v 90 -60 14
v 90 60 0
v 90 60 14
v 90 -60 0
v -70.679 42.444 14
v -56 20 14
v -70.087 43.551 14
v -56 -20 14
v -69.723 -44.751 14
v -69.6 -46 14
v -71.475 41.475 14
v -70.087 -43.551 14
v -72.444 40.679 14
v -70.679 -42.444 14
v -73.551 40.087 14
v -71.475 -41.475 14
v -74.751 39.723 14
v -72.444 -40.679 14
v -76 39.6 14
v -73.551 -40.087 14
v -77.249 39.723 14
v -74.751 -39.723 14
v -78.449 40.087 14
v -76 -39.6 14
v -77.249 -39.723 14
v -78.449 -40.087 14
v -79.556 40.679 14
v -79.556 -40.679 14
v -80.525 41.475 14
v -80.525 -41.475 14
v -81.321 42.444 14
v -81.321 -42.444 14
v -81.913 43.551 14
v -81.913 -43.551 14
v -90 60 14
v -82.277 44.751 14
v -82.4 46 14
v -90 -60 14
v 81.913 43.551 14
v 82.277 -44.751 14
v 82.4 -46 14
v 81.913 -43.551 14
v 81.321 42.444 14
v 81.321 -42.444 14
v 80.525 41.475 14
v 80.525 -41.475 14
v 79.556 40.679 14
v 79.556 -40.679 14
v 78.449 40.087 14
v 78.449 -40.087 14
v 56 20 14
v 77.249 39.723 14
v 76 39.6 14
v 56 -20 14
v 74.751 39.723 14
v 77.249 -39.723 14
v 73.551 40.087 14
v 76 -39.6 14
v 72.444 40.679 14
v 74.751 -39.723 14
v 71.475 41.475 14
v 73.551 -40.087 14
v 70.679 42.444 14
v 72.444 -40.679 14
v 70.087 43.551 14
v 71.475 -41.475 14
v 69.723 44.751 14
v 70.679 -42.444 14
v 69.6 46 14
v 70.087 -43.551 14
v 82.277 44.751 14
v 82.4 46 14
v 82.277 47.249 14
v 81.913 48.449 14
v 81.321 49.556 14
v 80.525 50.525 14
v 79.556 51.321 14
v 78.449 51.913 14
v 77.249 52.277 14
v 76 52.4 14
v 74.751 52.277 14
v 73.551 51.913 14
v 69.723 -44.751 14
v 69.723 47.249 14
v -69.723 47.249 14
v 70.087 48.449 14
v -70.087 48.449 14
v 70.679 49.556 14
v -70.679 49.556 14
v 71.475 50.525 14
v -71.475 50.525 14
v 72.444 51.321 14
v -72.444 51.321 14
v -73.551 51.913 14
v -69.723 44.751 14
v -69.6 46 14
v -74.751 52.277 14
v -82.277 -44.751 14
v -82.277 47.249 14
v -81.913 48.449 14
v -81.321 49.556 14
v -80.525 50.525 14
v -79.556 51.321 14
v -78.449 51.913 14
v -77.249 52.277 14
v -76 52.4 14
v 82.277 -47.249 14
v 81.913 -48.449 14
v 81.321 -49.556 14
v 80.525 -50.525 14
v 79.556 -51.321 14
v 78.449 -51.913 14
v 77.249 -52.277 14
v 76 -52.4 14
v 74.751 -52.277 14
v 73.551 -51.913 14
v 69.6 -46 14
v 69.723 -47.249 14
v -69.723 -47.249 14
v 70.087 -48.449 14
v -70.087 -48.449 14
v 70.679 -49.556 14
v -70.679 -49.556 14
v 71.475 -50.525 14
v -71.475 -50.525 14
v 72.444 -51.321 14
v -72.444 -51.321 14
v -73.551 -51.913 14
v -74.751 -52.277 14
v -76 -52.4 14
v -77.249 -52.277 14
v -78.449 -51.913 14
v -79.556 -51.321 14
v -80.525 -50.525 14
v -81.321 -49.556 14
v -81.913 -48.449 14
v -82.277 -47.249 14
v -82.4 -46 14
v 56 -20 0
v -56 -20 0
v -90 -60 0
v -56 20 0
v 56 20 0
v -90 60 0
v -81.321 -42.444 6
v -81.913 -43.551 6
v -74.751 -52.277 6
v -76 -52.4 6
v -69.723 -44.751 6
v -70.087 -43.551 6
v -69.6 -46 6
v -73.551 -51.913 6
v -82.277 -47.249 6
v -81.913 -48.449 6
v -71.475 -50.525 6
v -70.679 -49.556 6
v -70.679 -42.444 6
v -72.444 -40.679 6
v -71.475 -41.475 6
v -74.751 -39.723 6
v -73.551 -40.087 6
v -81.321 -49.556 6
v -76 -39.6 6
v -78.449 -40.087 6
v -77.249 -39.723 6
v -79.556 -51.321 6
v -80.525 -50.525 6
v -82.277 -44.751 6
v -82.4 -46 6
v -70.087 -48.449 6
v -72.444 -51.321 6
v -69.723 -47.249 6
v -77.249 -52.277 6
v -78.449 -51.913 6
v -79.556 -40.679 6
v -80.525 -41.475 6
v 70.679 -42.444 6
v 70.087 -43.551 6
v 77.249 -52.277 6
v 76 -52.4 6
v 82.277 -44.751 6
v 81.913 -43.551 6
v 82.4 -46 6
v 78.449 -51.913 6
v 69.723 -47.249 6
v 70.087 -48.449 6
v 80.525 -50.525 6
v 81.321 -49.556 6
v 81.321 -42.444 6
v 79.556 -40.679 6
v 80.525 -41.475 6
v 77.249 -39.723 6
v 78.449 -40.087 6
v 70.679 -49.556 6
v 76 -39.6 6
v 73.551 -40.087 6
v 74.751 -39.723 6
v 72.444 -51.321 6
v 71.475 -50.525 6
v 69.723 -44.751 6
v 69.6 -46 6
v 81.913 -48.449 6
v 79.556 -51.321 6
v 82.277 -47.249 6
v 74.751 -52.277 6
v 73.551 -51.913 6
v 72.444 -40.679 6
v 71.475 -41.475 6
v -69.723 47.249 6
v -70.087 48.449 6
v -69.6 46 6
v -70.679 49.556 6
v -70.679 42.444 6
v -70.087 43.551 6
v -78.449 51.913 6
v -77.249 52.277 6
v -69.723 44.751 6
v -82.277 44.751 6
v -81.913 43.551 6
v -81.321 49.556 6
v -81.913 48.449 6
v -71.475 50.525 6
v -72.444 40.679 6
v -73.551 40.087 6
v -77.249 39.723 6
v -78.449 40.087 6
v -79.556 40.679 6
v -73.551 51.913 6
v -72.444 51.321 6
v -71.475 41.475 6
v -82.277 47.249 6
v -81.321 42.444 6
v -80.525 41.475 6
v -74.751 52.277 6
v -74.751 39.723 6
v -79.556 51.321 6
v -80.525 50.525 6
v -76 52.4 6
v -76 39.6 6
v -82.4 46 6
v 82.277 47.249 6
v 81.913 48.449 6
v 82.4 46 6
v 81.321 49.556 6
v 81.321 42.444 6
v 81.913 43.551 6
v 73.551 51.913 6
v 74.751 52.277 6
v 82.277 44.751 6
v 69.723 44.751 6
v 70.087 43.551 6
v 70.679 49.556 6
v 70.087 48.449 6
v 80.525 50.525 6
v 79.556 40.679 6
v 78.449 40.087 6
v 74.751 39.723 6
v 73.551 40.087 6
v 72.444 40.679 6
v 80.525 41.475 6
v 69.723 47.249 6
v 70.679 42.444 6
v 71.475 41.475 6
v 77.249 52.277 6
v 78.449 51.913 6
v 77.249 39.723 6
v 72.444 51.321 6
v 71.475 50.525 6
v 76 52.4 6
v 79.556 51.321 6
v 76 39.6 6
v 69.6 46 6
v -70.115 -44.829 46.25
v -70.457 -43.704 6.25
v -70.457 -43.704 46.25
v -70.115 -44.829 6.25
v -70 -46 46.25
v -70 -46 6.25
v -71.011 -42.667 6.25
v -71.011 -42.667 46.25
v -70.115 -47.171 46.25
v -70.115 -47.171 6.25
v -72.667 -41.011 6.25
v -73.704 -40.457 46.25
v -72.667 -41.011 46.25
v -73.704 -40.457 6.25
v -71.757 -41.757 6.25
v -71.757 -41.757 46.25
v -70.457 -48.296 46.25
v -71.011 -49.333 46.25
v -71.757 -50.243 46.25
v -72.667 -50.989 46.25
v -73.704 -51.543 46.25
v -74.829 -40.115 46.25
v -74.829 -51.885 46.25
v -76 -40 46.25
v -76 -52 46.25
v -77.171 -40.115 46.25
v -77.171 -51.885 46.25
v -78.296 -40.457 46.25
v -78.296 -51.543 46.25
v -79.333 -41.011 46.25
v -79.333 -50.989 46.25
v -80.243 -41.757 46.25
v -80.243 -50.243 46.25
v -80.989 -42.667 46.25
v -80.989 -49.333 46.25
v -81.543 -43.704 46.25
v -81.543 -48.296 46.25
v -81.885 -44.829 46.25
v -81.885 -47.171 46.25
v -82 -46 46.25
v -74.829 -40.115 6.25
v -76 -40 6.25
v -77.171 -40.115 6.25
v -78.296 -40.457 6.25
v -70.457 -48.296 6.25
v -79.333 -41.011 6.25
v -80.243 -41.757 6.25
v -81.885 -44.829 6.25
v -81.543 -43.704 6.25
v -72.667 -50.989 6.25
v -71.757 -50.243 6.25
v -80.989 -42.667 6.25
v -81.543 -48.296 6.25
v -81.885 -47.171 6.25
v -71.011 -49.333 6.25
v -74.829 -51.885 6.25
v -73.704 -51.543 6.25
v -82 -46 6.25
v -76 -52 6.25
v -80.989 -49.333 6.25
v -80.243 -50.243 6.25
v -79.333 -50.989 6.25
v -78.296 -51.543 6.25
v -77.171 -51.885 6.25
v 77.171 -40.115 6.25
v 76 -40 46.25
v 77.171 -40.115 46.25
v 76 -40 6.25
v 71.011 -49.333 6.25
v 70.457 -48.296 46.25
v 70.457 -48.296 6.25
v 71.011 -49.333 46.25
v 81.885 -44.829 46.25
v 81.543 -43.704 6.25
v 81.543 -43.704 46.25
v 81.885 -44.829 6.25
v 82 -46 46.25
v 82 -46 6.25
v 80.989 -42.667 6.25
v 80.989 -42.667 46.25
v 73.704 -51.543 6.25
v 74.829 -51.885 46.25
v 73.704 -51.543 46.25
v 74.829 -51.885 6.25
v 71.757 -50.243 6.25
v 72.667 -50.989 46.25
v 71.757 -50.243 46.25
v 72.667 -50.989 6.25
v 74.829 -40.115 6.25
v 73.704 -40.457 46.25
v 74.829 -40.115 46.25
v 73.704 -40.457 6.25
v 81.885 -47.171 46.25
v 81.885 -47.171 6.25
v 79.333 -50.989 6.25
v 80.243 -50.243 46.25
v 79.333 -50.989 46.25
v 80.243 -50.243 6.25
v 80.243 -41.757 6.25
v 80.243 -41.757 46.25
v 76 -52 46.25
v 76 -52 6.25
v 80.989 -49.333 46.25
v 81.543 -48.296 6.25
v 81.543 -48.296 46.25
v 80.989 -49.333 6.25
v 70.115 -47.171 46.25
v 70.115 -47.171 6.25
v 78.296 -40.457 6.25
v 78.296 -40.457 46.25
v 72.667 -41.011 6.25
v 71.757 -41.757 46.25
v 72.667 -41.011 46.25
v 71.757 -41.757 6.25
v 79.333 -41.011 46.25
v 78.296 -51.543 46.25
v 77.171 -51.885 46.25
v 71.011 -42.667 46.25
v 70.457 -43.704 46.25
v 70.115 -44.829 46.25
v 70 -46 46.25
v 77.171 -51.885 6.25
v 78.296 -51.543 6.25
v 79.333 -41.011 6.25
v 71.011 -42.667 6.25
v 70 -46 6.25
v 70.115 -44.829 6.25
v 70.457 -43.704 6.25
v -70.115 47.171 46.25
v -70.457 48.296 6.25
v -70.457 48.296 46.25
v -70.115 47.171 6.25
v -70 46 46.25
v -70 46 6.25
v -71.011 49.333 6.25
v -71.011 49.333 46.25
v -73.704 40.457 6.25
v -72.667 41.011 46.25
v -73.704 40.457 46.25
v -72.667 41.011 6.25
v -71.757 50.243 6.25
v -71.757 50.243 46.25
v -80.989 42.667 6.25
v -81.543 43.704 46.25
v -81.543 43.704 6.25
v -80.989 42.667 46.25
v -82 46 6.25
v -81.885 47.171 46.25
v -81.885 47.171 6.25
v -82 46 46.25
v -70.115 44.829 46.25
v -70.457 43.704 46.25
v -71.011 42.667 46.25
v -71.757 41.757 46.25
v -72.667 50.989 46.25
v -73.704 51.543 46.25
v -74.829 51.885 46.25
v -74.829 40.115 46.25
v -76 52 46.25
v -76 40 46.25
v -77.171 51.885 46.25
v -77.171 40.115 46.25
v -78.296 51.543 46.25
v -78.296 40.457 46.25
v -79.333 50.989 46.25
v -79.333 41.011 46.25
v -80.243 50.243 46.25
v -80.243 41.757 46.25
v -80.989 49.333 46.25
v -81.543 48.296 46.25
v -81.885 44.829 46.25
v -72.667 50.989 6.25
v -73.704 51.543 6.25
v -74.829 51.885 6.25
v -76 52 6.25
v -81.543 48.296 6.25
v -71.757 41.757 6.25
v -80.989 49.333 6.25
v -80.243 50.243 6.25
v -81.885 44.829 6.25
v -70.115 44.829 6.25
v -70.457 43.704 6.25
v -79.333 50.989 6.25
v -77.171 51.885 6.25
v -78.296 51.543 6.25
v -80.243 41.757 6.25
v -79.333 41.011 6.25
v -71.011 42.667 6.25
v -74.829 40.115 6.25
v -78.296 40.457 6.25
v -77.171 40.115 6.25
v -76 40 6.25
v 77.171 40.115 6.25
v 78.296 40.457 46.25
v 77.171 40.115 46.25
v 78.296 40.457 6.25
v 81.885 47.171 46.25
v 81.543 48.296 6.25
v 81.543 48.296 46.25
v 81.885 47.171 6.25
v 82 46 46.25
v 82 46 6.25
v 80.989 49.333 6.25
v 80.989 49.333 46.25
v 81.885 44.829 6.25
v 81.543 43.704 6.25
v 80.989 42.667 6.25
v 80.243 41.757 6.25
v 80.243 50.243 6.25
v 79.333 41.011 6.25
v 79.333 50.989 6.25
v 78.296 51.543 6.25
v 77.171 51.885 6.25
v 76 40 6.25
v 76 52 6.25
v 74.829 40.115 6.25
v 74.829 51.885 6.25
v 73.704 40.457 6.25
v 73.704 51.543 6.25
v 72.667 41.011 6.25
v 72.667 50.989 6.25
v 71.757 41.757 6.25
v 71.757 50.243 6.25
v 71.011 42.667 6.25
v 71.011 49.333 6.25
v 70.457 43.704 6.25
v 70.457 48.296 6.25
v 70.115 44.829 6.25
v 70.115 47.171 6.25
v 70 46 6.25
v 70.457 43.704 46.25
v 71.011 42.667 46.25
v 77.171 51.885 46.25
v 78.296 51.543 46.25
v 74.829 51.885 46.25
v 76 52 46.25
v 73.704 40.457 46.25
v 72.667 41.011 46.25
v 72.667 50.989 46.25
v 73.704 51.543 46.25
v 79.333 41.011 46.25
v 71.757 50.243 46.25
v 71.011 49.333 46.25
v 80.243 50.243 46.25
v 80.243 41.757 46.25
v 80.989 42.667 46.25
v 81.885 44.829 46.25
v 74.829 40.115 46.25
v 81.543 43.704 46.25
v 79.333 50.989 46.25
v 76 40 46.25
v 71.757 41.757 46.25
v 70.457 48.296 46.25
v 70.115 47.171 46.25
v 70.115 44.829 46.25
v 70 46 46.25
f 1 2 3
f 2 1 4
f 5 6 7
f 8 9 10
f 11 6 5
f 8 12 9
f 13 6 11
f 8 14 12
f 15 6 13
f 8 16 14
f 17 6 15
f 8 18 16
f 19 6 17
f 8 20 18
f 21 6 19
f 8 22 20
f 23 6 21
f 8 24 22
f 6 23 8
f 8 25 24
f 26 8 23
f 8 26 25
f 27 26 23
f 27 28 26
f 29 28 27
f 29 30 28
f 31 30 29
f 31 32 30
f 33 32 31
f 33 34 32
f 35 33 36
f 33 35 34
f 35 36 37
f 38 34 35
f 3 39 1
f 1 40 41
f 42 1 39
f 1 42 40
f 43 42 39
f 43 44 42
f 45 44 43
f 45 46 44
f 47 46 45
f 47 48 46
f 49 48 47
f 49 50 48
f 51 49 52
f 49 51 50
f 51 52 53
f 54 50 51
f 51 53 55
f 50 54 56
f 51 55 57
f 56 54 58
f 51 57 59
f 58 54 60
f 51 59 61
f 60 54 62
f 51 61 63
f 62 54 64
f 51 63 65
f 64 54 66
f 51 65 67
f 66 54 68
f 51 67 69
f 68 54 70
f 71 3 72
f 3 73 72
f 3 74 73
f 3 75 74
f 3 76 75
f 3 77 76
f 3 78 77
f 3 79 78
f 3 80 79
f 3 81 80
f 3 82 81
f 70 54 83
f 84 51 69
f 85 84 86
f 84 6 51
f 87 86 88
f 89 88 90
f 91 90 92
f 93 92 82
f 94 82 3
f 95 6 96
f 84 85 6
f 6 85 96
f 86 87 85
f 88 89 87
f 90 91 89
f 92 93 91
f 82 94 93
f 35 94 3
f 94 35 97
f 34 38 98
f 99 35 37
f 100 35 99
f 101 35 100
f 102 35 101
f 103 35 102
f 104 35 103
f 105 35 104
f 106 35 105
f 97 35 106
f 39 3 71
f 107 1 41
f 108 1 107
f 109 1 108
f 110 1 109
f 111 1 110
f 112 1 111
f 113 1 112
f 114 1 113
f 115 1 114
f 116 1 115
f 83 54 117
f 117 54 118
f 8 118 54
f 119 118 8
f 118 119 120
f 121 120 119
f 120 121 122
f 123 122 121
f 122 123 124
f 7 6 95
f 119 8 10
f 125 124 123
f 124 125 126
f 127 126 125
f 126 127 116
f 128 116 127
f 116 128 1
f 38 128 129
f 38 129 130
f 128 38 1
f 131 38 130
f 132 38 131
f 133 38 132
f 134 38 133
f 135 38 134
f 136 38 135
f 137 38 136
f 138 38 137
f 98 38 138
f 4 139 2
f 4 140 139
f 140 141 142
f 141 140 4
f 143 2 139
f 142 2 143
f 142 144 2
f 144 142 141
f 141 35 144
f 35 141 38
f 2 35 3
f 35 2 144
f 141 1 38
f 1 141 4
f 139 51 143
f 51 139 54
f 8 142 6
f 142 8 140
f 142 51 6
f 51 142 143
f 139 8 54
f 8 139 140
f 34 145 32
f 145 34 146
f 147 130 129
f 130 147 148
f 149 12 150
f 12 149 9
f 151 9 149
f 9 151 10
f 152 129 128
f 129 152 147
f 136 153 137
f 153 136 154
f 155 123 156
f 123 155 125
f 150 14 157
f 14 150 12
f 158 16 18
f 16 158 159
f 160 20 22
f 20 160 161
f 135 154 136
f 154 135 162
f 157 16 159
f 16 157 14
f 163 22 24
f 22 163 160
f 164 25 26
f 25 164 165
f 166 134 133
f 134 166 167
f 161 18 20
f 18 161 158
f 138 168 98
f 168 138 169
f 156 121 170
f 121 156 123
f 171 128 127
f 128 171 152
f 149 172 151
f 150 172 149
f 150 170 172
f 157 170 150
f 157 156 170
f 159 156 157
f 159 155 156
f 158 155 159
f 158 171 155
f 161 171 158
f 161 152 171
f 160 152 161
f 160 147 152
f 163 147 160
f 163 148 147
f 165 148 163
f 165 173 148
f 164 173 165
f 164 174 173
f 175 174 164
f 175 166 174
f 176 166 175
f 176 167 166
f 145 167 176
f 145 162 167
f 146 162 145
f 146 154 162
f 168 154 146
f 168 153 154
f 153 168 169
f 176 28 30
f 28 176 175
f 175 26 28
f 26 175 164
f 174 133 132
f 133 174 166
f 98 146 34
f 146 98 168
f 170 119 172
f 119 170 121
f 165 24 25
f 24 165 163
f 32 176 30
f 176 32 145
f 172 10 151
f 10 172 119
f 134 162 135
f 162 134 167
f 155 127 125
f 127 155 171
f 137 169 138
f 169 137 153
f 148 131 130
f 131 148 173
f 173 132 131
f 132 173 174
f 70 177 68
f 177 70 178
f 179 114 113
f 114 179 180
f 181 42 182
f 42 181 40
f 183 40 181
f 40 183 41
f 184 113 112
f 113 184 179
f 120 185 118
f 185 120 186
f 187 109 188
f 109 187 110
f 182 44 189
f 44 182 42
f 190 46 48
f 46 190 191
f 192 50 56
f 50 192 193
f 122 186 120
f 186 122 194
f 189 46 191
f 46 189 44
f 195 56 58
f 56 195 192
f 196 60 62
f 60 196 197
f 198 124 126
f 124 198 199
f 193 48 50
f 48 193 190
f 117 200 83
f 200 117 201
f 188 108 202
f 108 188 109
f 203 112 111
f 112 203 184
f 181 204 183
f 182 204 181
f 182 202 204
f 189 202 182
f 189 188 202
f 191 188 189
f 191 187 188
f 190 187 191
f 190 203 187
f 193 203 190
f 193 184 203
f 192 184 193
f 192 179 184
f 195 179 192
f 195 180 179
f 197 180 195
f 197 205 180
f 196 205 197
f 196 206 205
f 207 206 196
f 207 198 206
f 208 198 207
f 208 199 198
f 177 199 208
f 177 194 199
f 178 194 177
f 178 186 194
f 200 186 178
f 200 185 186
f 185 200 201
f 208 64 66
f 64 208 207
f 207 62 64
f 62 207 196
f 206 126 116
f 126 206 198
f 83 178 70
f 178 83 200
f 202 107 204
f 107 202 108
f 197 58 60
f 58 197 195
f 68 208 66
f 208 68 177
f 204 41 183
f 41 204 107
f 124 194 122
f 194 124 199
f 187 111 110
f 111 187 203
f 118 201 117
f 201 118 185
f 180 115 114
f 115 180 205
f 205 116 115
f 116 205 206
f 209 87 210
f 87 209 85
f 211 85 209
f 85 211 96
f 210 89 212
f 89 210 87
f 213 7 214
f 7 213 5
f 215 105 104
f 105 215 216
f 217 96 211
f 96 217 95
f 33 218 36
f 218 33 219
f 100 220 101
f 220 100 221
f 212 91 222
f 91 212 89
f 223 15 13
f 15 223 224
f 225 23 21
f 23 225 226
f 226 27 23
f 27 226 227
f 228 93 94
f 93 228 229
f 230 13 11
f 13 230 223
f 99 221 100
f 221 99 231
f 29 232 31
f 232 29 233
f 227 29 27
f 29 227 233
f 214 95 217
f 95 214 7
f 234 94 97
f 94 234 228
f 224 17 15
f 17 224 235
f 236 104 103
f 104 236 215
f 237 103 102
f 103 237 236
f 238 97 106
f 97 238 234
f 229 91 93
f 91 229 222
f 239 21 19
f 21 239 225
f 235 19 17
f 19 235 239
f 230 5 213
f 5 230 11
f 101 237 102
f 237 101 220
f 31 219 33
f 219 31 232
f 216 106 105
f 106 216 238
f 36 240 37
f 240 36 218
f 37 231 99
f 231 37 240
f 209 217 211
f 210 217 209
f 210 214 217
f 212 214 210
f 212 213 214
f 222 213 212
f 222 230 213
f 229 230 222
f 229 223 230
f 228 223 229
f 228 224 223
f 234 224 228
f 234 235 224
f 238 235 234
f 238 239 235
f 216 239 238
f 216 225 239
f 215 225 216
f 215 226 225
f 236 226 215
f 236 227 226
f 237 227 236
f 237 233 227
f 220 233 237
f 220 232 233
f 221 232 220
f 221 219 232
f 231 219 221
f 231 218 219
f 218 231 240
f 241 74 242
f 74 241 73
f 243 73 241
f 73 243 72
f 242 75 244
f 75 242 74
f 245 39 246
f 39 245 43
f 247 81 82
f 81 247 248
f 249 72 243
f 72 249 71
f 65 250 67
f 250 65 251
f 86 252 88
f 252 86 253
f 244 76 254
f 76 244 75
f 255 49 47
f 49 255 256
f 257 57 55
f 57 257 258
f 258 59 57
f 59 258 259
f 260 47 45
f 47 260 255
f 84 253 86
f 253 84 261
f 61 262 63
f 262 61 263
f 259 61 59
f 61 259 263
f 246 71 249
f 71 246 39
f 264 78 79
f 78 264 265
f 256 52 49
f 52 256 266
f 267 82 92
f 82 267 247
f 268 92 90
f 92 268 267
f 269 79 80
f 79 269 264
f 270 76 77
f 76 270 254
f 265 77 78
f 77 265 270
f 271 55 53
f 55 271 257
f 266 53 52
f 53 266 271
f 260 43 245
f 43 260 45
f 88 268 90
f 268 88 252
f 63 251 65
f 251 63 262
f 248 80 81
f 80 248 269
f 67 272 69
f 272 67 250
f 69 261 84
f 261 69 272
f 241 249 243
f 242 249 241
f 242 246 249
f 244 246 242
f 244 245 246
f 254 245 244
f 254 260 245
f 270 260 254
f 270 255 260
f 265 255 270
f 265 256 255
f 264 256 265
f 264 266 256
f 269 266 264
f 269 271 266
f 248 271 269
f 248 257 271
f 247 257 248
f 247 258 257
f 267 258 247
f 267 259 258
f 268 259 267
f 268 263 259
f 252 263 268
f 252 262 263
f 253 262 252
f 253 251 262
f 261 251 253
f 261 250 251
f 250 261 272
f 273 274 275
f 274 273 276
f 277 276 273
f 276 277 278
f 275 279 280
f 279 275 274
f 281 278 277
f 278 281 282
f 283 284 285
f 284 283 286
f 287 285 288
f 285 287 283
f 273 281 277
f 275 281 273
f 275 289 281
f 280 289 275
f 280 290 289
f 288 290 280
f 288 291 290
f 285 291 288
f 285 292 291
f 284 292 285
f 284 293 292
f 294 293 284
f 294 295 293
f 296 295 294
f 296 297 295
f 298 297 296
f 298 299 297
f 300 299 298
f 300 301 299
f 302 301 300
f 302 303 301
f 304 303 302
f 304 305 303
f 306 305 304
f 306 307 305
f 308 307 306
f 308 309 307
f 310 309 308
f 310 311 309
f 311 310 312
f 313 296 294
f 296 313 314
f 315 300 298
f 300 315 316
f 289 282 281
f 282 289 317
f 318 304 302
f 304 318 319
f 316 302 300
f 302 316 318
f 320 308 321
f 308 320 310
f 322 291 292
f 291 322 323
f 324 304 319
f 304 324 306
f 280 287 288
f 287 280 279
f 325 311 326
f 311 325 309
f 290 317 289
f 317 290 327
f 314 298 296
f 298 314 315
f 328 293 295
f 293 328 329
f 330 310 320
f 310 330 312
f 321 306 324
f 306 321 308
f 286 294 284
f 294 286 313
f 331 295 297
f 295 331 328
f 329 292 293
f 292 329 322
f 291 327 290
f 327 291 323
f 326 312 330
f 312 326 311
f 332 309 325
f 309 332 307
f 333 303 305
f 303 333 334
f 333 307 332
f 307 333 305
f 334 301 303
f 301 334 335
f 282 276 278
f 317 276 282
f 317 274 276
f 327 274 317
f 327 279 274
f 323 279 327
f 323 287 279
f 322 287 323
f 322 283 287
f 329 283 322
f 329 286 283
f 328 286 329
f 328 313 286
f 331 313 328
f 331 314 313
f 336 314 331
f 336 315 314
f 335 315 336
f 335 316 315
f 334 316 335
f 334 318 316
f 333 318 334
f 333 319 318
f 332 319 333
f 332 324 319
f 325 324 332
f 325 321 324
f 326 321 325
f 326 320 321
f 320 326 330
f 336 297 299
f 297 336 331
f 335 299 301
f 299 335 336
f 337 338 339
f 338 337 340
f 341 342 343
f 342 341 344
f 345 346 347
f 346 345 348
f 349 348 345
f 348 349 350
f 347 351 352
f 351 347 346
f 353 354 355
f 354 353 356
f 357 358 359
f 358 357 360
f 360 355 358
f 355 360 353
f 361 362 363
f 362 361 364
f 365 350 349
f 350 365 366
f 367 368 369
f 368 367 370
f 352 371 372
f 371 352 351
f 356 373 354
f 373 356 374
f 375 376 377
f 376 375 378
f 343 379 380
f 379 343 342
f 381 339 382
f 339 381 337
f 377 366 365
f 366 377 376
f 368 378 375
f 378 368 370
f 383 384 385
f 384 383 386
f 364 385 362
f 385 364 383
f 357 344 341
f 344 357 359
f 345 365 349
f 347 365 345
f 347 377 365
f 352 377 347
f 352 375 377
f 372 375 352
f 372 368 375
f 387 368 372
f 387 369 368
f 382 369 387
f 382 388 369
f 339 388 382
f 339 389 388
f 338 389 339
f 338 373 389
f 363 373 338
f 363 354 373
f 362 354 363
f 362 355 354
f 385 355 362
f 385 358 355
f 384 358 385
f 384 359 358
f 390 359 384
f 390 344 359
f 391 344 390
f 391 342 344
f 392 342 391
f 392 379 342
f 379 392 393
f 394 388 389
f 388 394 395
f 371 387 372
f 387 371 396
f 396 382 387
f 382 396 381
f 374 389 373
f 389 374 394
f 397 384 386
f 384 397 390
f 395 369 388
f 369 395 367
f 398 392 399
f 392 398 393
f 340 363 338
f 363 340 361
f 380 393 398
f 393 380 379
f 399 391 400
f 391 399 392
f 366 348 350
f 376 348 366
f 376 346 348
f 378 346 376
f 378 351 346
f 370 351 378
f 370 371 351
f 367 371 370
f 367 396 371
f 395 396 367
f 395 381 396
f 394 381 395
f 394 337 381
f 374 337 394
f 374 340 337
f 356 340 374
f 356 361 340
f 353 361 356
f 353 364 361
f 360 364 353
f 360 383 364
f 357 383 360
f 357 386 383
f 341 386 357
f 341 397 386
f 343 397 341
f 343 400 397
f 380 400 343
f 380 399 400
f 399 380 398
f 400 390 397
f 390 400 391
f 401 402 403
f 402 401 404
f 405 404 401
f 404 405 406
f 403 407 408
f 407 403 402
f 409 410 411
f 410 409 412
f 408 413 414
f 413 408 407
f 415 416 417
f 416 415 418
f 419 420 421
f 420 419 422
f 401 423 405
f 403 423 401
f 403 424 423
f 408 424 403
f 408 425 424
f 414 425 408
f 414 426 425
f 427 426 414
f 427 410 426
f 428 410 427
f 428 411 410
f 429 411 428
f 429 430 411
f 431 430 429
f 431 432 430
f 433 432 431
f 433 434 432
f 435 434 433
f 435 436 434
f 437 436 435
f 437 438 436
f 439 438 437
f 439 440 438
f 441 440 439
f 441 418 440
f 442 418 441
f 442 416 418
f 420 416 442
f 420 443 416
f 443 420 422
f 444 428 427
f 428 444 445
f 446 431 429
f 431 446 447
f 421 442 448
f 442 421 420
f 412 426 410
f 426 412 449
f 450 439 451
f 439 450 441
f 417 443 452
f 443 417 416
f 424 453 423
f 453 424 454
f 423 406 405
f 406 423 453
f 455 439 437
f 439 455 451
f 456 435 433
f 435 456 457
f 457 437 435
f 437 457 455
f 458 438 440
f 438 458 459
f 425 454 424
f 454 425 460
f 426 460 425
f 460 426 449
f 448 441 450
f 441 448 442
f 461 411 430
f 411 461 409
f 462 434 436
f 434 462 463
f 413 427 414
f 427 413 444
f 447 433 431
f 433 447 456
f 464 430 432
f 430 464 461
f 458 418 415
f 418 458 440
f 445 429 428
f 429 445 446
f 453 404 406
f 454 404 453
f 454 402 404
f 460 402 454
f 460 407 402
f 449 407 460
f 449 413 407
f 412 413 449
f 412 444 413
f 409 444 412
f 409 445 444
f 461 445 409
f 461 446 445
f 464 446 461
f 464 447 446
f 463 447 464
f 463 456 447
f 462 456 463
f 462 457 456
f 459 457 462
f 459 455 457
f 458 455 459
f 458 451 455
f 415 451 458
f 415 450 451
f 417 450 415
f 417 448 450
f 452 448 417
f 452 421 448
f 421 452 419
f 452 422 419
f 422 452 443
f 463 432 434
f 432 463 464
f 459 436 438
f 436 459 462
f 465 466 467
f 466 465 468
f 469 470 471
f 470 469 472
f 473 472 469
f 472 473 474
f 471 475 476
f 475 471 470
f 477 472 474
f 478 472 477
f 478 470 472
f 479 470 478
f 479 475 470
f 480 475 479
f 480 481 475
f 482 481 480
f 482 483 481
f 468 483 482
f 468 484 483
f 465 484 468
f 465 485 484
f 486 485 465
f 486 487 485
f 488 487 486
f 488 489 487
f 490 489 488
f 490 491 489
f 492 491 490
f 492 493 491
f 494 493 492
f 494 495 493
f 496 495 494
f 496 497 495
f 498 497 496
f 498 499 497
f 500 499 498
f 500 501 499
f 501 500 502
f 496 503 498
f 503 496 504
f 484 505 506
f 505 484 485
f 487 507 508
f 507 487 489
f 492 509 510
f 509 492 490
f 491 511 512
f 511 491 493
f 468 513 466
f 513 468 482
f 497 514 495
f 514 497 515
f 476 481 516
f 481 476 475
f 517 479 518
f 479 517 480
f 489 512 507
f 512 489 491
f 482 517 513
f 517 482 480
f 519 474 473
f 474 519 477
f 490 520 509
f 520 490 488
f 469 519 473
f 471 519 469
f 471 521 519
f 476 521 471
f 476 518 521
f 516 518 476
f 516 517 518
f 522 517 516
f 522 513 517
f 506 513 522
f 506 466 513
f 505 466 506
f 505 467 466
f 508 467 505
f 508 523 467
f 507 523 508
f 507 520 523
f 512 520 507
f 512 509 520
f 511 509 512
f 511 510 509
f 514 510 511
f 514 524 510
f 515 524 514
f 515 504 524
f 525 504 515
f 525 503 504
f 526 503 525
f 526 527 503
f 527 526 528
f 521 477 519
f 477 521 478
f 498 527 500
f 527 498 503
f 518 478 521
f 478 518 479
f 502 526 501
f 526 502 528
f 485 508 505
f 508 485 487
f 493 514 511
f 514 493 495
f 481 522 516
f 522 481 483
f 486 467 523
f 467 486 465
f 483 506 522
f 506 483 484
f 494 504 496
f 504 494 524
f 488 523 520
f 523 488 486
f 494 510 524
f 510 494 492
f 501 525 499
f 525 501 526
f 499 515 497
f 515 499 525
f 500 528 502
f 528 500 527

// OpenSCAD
$fn = 32;

// ------------------------------------------------------------------------
// Frame with four posts: 180 x 120 mm frame, four d12 posts
// Every part is its own module, assembly() places them once.
// ------------------------------------------------------------------------

// --- part 1 ---
module base_frame() {
  difference() {
    translate([-90, -60, 0]) cube([180, 120, 14]);
    translate([-56, -20, -1]) cube([112, 40, 16]);
    translate([-76, -46, 6]) cylinder(h = 9, d = 12.8);
    translate([76, -46, 6]) cylinder(h = 9, d = 12.8);
    translate([-76, 46, 6]) cylinder(h = 9, d = 12.8);
    translate([76, 46, 6]) cylinder(h = 9, d = 12.8);
  }
}

// --- part 2 ---
module post1() {
  cylinder(h = 40, d = 12);
}

// --- part 3 ---
module post2() {
  cylinder(h = 40, d = 12);
}

// --- part 4 ---
module post3() {
  cylinder(h = 40, d = 12);
}

// --- part 5 ---
module post4() {
  cylinder(h = 40, d = 12);
}

// --- assembly ---
module assembly() {
  translate([0, 0, 0]) rotate([0, 0, 0]) base_frame();
  translate([-76, -46, 6.25]) rotate([0, 0, 0]) post1();
  translate([76, -46, 6.25]) rotate([0, 0, 0]) post2();
  translate([-76, 46, 6.25]) rotate([0, 0, 0]) post3();
  translate([76, 46, 6.25]) rotate([0, 0, 0]) post4();
}

assembly();
